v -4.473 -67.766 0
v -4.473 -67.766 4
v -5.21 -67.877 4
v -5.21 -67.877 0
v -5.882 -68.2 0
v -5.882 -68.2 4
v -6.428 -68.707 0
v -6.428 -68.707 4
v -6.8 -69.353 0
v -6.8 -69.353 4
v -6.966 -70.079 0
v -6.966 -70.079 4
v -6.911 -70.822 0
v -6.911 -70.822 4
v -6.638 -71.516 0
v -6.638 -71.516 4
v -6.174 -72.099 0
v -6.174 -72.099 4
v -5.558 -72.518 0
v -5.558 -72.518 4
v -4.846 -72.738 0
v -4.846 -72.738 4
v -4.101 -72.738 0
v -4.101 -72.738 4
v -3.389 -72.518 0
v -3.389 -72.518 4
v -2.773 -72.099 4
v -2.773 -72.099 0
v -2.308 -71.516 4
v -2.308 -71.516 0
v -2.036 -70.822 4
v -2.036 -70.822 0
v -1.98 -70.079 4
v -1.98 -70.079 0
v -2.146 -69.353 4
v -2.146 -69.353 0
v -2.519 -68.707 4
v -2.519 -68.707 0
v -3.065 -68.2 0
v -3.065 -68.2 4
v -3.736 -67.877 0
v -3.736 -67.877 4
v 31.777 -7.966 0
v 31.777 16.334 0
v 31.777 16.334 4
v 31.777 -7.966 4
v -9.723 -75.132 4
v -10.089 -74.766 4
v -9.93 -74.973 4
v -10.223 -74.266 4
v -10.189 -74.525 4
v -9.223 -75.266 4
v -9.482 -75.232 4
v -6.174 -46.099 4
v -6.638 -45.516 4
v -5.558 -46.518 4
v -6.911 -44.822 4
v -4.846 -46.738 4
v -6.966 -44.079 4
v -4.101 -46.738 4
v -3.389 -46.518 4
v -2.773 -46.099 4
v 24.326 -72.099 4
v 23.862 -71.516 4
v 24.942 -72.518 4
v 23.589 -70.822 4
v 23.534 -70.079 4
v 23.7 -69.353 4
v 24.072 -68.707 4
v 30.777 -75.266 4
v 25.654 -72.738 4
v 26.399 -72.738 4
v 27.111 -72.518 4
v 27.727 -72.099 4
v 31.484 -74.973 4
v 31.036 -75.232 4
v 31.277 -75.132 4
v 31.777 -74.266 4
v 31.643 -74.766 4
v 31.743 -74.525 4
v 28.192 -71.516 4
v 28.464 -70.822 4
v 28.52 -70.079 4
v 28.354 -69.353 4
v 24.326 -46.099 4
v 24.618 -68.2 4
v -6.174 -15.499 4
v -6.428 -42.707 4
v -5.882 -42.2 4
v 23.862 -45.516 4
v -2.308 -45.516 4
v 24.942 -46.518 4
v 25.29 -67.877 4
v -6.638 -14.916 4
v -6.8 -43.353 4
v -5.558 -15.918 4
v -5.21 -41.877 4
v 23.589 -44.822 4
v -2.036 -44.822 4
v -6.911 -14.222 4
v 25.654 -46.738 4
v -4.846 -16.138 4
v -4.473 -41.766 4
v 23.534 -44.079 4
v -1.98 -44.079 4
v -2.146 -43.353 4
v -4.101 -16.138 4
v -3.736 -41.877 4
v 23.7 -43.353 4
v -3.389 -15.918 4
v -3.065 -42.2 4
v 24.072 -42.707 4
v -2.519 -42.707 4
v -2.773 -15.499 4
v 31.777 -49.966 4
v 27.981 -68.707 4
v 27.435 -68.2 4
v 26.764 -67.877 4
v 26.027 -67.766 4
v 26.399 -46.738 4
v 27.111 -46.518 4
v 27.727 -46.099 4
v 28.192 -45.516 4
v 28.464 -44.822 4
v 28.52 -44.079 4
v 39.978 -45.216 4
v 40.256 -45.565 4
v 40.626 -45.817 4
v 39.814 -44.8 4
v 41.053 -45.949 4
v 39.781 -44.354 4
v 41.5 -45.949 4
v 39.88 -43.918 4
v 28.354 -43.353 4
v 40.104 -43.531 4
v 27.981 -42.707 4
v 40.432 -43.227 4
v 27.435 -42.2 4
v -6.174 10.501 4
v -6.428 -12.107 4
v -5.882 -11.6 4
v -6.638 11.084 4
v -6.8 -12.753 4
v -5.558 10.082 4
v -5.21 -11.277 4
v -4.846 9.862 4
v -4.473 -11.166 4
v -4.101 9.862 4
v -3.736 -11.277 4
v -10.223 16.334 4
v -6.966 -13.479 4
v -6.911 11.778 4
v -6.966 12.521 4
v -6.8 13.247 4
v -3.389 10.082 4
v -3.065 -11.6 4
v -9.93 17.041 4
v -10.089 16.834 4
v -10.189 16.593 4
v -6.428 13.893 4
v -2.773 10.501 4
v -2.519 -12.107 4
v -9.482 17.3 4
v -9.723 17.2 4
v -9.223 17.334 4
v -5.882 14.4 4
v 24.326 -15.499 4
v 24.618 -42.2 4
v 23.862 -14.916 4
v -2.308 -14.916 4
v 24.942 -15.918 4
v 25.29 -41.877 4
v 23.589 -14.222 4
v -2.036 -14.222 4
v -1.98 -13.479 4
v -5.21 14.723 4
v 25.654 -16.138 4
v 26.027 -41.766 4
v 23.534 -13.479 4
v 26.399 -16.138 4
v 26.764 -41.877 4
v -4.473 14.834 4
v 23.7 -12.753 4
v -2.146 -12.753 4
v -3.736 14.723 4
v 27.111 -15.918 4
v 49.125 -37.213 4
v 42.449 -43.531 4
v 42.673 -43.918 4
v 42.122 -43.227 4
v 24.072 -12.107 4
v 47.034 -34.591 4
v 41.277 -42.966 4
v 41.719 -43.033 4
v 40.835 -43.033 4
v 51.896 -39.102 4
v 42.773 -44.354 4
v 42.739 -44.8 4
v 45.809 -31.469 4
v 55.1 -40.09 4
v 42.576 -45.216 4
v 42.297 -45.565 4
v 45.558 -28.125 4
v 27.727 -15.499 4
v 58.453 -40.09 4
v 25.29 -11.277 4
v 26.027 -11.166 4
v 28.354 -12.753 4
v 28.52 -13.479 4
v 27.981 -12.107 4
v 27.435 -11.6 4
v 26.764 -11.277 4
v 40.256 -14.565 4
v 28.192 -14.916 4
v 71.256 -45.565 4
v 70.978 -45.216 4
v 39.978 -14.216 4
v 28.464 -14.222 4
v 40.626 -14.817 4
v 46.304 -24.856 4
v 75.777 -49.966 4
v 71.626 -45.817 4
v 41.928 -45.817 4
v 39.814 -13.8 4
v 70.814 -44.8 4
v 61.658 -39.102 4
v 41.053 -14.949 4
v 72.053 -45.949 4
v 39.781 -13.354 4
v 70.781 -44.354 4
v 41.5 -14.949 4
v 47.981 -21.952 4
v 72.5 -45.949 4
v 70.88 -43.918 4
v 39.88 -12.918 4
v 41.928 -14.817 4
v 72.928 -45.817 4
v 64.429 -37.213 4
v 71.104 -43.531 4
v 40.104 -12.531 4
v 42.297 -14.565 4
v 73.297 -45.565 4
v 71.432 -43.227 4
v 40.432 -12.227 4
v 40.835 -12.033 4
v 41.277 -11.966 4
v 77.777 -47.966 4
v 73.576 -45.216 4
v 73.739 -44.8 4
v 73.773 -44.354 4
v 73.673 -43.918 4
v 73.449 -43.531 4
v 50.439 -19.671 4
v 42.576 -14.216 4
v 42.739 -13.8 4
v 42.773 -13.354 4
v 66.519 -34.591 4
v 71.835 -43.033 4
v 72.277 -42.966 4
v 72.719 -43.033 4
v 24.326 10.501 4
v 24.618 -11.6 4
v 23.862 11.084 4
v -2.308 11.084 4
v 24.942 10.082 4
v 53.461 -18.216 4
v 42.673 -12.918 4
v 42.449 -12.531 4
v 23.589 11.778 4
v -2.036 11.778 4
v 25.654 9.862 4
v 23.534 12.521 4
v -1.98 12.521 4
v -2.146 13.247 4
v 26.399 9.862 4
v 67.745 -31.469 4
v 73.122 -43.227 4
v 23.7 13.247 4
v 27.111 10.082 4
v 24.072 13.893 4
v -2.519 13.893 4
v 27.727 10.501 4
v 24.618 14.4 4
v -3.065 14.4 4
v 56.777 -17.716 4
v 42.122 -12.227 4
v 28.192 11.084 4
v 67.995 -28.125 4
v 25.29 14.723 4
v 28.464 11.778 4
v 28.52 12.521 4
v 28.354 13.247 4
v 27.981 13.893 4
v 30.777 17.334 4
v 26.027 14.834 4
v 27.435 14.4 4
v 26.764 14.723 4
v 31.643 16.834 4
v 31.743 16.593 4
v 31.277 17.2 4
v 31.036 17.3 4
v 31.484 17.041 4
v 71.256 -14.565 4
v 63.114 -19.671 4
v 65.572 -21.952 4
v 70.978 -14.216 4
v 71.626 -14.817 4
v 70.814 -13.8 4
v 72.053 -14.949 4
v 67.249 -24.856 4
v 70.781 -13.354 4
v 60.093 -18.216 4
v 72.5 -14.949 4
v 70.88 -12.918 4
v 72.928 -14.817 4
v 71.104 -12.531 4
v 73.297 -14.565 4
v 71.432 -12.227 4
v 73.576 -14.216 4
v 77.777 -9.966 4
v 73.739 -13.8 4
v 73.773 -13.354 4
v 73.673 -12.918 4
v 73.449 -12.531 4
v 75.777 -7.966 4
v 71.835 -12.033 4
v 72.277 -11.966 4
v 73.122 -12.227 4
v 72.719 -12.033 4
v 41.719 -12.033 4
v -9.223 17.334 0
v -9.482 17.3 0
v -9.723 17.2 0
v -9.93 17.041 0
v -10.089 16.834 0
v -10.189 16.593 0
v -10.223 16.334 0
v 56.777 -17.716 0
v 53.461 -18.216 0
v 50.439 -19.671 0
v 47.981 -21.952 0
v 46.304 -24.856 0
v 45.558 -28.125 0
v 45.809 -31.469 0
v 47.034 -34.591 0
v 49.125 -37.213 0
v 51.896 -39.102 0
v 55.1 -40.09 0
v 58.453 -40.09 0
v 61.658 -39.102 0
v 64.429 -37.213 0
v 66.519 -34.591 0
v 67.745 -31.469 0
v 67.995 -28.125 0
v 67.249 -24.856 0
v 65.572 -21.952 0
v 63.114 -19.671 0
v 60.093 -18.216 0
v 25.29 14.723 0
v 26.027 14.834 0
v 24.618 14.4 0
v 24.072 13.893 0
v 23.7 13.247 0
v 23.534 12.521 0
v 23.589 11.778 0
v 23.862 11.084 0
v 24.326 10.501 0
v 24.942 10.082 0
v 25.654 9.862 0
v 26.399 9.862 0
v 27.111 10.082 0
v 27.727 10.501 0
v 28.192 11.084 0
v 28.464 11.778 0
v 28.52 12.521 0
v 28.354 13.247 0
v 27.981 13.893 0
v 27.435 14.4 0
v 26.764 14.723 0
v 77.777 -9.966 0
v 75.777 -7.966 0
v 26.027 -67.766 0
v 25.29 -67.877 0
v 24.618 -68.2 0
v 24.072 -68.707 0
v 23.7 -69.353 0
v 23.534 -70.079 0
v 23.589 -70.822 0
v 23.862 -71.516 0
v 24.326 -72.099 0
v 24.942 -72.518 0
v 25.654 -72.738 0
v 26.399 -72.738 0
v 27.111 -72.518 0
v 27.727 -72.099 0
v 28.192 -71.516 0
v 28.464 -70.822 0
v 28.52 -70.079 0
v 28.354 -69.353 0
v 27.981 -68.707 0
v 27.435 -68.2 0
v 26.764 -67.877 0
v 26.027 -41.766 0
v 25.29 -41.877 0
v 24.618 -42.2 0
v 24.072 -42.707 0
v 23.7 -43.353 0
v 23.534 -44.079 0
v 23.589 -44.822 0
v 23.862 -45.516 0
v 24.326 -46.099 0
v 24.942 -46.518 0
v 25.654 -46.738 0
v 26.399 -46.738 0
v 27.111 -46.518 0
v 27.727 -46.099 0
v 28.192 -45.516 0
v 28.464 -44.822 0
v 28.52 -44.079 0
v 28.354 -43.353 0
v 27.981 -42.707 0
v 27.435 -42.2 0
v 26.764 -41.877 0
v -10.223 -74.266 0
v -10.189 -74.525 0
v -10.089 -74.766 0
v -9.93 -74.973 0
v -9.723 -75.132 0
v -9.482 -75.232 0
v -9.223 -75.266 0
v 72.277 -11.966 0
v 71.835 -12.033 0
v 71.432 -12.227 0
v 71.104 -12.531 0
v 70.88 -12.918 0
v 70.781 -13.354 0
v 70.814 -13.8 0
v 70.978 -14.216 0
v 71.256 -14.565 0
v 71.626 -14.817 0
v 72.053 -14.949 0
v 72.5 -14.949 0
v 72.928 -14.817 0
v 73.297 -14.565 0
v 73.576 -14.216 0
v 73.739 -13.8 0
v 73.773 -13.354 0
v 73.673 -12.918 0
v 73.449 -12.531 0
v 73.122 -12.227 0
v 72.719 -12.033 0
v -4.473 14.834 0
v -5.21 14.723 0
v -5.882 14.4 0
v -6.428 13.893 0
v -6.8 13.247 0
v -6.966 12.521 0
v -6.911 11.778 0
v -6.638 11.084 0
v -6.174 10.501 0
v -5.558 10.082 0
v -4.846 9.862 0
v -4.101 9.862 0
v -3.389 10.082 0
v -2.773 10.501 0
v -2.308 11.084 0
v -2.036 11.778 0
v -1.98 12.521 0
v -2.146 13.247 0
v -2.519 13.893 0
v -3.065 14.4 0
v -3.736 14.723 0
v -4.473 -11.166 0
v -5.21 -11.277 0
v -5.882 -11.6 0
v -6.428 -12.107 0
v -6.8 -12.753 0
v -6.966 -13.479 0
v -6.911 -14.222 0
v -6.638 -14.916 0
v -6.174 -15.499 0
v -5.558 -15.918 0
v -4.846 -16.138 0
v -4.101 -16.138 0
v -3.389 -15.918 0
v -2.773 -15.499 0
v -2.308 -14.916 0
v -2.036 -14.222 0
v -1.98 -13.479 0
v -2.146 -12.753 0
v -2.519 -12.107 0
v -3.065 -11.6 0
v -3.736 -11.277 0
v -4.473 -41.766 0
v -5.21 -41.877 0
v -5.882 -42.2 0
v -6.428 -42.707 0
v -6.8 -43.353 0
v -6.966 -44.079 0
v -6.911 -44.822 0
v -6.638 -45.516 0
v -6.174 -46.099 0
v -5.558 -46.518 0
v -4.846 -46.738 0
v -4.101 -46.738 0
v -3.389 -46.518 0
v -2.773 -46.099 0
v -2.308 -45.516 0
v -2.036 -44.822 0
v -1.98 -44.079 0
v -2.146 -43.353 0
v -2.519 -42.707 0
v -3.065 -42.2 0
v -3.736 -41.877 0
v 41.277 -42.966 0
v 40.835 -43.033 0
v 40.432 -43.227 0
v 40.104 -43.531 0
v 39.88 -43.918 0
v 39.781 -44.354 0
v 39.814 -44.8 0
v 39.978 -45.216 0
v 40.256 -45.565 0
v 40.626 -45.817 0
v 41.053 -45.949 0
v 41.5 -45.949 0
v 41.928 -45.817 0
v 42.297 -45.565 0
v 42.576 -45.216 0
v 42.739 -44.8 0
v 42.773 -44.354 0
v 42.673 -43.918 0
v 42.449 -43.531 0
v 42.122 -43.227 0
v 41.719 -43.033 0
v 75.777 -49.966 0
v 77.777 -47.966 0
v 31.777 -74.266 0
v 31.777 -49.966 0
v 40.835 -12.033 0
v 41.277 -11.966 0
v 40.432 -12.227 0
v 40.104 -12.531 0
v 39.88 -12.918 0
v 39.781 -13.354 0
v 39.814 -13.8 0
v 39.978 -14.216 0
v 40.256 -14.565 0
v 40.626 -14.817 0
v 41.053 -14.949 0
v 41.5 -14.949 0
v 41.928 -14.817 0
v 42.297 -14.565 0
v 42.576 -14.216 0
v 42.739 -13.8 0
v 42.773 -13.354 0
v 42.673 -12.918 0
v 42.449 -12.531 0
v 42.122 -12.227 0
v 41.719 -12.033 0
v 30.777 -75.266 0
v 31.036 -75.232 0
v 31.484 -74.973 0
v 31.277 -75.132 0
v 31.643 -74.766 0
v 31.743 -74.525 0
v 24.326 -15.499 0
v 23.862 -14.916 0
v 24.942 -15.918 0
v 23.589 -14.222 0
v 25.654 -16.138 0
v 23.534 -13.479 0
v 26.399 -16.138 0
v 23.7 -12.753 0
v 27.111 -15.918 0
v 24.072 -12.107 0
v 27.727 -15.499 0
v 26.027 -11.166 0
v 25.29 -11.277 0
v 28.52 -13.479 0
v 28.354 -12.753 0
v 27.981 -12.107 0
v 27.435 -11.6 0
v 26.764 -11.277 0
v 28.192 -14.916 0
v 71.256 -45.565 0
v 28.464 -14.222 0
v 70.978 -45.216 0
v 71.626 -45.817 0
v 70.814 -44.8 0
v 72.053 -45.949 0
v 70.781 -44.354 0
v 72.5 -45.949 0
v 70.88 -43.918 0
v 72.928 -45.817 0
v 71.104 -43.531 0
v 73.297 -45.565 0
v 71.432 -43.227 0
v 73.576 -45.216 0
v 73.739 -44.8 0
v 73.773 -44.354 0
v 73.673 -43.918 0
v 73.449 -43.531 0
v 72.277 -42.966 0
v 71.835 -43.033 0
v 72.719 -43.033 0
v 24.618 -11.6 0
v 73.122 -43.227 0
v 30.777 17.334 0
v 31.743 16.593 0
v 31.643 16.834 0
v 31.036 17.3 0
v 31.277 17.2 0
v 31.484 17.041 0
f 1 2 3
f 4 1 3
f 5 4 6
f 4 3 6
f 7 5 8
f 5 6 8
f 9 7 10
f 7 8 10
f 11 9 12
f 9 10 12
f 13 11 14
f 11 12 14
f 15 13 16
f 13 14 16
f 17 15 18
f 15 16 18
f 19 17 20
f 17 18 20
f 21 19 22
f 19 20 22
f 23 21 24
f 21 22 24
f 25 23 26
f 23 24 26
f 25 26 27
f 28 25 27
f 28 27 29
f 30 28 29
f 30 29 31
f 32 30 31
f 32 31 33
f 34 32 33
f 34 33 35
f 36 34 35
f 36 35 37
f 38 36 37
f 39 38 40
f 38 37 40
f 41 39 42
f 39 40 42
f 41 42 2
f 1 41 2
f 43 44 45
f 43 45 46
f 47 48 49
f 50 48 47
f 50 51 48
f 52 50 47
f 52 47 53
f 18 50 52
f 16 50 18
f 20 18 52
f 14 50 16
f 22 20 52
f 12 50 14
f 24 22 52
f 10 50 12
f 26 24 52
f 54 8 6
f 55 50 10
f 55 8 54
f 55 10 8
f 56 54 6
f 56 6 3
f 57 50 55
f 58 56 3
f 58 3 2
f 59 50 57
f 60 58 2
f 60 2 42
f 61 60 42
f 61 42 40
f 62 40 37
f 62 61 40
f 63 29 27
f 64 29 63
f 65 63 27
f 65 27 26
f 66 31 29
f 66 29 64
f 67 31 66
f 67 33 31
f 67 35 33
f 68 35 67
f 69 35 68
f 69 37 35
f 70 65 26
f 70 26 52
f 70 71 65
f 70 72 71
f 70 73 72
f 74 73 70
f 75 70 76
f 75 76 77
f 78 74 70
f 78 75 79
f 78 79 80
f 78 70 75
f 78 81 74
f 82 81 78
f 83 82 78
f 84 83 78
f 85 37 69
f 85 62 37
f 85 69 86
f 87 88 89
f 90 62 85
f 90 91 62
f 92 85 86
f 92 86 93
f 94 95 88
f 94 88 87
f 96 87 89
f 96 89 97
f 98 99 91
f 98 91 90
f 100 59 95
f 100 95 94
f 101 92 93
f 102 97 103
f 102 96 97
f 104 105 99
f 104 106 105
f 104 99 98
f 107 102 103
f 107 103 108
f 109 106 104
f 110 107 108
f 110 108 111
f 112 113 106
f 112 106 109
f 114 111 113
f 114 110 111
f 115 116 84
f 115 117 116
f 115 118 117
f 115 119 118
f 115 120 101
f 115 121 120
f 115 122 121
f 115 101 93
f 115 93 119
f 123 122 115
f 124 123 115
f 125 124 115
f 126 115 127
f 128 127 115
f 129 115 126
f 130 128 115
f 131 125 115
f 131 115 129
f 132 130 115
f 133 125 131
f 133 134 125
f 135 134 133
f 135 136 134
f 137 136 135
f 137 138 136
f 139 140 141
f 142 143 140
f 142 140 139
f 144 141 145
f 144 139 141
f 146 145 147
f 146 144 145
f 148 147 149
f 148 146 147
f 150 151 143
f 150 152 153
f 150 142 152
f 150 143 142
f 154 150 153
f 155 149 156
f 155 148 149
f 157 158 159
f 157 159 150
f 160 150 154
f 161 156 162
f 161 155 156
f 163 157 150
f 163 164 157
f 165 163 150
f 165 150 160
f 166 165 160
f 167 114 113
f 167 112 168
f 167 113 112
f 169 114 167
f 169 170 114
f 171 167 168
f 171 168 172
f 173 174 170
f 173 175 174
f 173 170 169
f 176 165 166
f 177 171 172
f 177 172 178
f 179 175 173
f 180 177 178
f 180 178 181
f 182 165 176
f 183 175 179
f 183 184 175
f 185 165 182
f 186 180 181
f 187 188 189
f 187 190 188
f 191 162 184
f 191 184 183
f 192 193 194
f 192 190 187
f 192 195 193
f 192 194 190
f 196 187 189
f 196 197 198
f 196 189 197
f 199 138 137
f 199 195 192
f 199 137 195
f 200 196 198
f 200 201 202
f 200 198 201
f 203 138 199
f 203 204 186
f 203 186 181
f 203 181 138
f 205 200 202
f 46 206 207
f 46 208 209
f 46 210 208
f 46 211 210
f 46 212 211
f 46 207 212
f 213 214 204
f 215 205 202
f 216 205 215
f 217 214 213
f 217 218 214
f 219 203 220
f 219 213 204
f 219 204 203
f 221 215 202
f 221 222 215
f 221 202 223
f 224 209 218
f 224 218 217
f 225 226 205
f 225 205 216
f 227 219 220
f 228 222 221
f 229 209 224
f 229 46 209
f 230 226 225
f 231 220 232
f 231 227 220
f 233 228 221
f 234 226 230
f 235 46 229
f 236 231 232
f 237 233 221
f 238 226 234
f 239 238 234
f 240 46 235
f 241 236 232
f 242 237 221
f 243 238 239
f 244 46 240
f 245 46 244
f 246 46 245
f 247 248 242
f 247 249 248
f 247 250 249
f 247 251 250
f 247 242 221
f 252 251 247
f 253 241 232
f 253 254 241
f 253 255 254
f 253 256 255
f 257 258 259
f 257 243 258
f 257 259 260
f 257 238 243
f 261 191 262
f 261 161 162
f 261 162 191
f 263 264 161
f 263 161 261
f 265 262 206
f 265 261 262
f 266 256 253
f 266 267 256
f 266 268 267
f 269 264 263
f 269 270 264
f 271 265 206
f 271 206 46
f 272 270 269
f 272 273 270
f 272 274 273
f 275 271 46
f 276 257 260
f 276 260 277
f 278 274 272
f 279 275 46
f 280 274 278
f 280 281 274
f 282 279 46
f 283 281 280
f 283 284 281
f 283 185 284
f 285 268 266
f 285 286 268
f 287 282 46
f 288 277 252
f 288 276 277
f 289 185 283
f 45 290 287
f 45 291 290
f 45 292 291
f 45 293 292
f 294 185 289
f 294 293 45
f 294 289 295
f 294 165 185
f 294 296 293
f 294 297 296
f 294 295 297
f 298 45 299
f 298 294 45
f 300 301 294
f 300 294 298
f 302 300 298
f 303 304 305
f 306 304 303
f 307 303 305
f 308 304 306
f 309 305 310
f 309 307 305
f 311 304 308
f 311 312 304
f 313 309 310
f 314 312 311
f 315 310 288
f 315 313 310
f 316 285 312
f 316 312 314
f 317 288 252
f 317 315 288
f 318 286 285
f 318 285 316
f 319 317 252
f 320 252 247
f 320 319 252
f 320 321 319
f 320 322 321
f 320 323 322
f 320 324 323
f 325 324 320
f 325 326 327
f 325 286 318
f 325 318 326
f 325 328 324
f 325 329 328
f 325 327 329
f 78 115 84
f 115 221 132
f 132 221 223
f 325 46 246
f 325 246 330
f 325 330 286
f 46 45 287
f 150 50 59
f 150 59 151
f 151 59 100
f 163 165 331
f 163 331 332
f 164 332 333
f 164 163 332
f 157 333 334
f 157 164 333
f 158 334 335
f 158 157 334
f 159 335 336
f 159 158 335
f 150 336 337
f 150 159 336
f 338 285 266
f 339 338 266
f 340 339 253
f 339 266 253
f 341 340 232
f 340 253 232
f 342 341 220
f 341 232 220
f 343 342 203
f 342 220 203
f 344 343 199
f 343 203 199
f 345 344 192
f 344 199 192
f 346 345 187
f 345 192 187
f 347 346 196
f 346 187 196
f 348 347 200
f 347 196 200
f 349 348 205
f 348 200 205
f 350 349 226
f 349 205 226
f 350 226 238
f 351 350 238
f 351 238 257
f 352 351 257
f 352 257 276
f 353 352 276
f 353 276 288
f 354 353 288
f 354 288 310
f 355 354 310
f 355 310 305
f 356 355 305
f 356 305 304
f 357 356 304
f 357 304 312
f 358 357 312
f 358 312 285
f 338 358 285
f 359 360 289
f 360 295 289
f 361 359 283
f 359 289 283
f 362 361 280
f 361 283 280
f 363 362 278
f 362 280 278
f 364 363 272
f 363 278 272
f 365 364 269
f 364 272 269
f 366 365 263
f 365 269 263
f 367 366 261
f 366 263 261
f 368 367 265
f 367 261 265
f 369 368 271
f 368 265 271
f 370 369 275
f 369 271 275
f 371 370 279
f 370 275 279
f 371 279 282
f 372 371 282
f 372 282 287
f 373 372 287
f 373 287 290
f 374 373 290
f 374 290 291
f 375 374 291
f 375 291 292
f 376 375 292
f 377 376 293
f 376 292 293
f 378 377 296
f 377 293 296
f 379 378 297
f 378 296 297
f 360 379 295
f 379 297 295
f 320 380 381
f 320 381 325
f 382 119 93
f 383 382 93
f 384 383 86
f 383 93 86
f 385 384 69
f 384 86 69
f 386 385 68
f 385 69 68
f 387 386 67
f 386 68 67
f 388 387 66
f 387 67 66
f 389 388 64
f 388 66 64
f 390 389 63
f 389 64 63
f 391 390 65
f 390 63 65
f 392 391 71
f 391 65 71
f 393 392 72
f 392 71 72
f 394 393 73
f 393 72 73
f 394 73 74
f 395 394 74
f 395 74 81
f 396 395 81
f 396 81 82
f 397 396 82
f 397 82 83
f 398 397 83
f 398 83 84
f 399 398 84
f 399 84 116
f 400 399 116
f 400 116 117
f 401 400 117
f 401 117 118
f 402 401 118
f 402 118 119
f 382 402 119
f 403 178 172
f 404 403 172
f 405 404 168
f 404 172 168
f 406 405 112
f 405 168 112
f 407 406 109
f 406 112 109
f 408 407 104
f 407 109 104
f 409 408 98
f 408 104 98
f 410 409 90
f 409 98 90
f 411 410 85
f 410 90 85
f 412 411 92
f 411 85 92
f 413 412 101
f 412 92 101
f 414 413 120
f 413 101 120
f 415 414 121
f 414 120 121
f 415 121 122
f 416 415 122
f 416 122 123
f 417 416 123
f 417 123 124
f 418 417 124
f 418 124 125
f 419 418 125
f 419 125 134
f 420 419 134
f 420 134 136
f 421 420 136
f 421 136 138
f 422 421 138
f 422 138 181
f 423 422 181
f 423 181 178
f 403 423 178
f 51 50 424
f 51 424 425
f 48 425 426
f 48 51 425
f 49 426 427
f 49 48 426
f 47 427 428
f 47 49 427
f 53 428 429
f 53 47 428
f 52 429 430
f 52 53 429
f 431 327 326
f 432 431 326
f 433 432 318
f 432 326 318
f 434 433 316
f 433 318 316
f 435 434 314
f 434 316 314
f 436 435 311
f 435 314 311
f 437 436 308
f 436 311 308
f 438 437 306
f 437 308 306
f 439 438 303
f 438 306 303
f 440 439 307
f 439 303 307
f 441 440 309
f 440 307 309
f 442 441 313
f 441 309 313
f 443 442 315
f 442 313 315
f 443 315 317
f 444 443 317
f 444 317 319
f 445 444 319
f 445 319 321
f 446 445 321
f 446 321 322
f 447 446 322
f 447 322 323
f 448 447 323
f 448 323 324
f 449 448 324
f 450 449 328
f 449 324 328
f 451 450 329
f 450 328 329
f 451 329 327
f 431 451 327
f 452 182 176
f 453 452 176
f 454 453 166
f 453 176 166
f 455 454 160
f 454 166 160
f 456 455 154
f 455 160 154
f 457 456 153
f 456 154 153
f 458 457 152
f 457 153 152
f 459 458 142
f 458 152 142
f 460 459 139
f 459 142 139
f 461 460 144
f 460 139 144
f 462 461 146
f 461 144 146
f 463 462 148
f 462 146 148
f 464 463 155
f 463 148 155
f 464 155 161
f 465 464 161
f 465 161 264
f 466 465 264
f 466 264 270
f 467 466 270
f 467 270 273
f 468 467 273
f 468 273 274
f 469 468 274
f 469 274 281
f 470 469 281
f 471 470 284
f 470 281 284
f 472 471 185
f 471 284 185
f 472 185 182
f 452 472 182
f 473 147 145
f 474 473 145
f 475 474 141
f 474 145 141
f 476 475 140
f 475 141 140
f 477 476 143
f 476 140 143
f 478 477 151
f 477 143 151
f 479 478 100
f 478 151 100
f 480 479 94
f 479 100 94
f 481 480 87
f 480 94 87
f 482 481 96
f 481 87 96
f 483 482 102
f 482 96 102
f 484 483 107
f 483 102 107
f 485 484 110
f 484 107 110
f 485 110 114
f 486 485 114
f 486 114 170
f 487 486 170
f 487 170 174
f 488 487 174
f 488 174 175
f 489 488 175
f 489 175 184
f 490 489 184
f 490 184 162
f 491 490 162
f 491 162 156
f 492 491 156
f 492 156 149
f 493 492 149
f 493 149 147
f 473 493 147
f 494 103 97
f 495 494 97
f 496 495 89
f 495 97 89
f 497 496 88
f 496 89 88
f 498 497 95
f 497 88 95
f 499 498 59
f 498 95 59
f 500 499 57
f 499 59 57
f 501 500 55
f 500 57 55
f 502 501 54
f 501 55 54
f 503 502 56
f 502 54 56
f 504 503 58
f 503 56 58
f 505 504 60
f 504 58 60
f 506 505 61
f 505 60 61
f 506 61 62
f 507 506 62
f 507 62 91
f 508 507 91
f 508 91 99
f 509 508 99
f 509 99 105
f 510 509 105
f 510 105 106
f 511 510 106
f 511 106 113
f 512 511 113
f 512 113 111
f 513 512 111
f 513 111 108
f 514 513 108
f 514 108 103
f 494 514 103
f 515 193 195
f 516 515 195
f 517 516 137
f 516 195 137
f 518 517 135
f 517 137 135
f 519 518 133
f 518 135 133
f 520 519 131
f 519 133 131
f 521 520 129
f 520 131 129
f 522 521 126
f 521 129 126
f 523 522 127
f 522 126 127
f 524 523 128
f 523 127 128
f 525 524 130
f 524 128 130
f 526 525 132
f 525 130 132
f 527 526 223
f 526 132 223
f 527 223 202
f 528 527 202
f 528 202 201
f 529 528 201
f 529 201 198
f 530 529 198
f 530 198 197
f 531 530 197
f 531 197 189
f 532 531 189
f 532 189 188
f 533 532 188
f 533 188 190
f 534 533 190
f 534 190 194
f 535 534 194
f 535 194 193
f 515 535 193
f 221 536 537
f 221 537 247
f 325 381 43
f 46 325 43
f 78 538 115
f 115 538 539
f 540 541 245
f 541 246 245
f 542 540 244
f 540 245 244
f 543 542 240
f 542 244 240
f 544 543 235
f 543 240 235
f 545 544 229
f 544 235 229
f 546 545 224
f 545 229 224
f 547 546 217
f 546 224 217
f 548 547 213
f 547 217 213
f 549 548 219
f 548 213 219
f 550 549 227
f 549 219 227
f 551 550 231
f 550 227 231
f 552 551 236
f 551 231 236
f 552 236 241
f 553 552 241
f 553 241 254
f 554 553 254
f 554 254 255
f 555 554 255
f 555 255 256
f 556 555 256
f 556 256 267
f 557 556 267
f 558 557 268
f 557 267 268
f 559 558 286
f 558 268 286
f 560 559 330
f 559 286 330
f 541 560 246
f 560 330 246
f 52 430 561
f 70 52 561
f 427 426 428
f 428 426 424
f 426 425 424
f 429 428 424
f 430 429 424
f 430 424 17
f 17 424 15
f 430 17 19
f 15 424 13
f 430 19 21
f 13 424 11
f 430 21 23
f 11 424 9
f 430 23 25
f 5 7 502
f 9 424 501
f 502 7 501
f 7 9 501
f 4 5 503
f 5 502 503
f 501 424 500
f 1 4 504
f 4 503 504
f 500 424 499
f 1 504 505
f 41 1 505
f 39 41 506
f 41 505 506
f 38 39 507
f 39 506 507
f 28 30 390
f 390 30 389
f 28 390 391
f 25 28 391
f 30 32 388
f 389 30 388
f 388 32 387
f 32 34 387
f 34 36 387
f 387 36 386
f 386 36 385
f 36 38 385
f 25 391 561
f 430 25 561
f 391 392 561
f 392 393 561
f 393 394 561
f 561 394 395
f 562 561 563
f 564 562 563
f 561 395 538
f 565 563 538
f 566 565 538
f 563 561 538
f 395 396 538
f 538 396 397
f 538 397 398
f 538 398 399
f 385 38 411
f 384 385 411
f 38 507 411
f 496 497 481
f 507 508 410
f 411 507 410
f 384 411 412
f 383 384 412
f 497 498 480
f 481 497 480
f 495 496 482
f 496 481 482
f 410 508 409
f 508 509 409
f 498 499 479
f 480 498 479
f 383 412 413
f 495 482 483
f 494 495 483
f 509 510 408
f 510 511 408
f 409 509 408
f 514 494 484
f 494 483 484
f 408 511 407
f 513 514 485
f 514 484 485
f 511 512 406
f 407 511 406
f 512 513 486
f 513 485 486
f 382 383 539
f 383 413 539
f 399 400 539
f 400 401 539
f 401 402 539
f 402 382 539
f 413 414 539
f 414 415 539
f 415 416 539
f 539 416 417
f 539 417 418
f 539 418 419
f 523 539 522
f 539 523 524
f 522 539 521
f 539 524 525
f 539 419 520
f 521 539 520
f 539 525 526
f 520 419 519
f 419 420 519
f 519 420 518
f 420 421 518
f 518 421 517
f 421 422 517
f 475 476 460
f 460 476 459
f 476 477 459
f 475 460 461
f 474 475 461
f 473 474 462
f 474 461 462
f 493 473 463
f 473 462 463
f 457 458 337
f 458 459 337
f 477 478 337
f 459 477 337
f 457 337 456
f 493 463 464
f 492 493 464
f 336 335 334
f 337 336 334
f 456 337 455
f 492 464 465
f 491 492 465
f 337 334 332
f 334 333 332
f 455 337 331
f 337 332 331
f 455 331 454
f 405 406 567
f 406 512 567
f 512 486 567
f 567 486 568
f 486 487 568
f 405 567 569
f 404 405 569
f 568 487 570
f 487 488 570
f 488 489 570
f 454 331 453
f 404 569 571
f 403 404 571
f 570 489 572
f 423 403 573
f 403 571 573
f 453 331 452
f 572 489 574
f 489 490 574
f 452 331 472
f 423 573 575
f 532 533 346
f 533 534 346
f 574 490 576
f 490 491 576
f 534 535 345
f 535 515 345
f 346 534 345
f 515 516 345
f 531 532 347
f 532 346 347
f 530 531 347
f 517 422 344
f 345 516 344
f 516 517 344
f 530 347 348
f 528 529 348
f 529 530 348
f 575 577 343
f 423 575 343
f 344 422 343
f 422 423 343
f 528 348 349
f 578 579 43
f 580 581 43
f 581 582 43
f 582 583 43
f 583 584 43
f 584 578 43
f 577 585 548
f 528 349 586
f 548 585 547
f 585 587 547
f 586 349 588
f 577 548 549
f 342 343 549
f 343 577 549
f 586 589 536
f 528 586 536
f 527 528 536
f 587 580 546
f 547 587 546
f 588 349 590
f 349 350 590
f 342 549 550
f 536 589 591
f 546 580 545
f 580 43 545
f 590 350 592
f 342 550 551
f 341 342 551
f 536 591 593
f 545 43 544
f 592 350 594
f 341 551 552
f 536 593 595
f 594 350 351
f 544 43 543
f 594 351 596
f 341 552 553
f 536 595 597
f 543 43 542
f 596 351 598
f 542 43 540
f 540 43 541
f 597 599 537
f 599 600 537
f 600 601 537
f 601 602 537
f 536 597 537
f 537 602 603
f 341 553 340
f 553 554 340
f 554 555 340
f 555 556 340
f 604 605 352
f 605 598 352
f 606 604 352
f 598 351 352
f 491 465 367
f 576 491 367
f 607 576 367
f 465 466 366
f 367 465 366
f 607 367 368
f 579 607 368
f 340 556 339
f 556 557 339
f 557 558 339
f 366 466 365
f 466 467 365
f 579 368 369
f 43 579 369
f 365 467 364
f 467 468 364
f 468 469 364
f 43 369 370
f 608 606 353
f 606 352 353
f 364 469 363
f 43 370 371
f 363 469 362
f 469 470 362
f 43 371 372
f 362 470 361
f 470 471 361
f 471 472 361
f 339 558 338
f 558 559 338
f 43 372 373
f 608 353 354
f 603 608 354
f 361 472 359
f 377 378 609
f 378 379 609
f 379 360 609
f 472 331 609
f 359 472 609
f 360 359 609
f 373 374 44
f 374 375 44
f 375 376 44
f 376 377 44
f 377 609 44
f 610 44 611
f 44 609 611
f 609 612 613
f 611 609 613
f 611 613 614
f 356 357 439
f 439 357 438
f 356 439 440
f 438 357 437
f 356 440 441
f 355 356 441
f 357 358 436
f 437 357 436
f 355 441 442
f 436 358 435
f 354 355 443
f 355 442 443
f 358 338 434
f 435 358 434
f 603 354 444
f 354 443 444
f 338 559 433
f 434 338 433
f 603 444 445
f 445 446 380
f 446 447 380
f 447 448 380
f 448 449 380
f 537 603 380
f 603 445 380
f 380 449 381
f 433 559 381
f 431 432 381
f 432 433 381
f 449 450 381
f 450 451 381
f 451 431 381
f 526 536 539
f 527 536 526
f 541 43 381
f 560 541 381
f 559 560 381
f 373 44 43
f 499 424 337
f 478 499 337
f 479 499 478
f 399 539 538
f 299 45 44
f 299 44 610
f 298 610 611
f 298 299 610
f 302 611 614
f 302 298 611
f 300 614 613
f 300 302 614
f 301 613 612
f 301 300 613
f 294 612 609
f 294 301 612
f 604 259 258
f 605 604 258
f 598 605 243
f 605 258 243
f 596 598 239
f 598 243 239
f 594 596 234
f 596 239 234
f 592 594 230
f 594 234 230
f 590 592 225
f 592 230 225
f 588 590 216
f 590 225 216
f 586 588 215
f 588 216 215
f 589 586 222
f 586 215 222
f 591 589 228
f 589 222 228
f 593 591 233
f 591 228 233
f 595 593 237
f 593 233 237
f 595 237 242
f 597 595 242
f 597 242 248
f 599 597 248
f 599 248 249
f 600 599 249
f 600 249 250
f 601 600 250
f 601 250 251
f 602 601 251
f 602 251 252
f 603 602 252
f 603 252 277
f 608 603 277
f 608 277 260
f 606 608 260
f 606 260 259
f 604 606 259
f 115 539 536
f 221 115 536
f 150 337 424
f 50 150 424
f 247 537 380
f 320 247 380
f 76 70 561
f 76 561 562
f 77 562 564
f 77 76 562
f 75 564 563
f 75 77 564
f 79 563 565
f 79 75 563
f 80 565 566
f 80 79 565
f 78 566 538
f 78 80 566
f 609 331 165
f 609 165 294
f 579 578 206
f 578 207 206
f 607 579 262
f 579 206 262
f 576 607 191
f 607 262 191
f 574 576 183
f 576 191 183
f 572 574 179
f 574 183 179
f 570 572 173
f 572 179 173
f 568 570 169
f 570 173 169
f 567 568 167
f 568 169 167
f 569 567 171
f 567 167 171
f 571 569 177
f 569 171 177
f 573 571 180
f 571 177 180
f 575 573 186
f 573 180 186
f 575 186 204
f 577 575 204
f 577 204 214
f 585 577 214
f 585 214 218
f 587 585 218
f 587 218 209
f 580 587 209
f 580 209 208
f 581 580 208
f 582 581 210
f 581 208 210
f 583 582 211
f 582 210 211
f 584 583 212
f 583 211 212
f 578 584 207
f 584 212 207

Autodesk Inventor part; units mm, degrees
ref_plane "YZ Plane" through (0, 0, 0) normal (1, 0, 0) x (0, 1, 0)
ref_plane "XZ Plane" through (0, 0, 0) normal (0, 1, 0) x (-1, 0, 0)
ref_plane "XY Plane" through (0, 0, 0) normal (0, 0, 1) x (1, 0, 0)
sketch "Szkic1" plane through (0, 0, 0) normal (0, 0, 1) x (1, 0, 0)
  line L0 (-10.2233, 17.3341) -> (-10.2233, -75.2659)
  line L1 (-10.2233, -75.2659) -> (31.7767, -75.2659)
  line L2 (-10.2233, 17.3341) -> (31.7767, 17.3341)
  line L3 (31.7767, 17.3341) -> (31.7767, -7.9659)
  line L4 (31.7767, -75.2659) -> (31.7767, -49.9659)
  line L5 (31.7767, -49.9659) -> (77.7767, -49.9659)
  line L6 (77.7767, -49.9659) -> (77.7767, -7.9659)
  line L7 (77.7767, -7.9659) -> (31.7767, -7.9659)
  point P0 (0, 0)
  point P1 (41.2767, -13.4659)
  point P2 (72.2767, -13.4659)
  point P3 (41.2767, -44.4659)
  point P4 (72.2767, -44.4659)
  point P5 (56.7767, -28.9659)
  point P6 (-4.4733, 12.3341)
  point P7 (26.0267, 12.3341)
  point P8 (-4.4733, -13.6659)
  point P9 (26.0267, -13.6659)
  point P10 (-4.4733, -44.2659)
  point P11 (26.0267, -44.2659)
  point P12 (-4.4733, -70.2659)
  point P13 (26.0267, -70.2659)
  dimension "d0" = 92.6
  dimension "d1" = 42
  dimension "d2" = 42
  dimension "d3" = 46
  dimension "d4" = 25.3
  dimension "d11" = 15.5
  dimension "d12" = 15.5
  dimension "d14" = 15.5
  dimension "d15" = 15.5
  dimension "d16" = 15.5
  dimension "d17" = 15.5
  dimension "d18" = 15.5
  dimension "d19" = 15.5
  dimension "d20" = 21
  dimension "d21" = 21
  dimension "d39" = 5
  dimension "d40" = 5
  dimension "d41" = 5
  dimension "d42" = 5
  dimension "d43" = 5.75
  dimension "d44" = 5.75
  dimension "d45" = 42
  dimension "d46" = 5.75
  dimension "d47" = 5.75
  dimension "d48" = 5.75
  dimension "d49" = 5.75
  dimension "d50" = 25.3
  dimension "d51" = 5.75
  dimension "d52" = 5.75
  dimension "d60" = 26
  dimension "d61" = 26
  dimension "d62" = 26
  dimension "d63" = 26
extrude "Wyciągnięcie proste1" add sketch "Szkic1" along normal blind 4
hole "Otwór1" at (41.2767, -13.4659, 0) at (72.2767, -13.4659, 0) at (41.2767, -44.4659, 0) at (72.2767, -44.4659, 0) direction (0, 0, 1) diameter 3 end through all
hole "Otwór2" at (56.7767, -28.9659, 0) direction (0, 0, 1) diameter 22.5 end through all
chamfer "Faza1" distance 2 angle 45 2 edges at (77.7767, -7.9659, 2) (77.7767, -49.9659, 2)
hole "Otwór3" at (-4.4733, 12.3341, 0) at (26.0267, 12.3341, 0) at (-4.4733, -13.6659, 0) at (26.0267, -13.6659, 0) at (-4.4733, -44.2659, 0) at (26.0267, -44.2659, 0) at (-4.4733, -70.2659, 0) at (26.0267, -70.2659, 0) direction (0, 0, 1) diameter 5 end through all
fillet "Zaokrąglenie1" radius 1 4 edges at (31.7767, 17.3341, 2) (-10.2233, 17.3341, 2) (31.7767, -75.2659, 2) (-10.2233, -75.2659, 2)
equation "\"d4\" = -0.5 * d2 + 0.5 * d0"
equation "\"d11\" = 0.5 * d9"
equation "\"d12\" = d11"
equation "\"d14\" = d11"
equation "\"d21\" = d20"
equation "\"d39\" = d41"
equation "\"d40\" = d41"
equation "\"d42\" = d41"
equation "\"d44\" = d43"
equation "\"d45\" = d1"
equation "\"d46\" = d43"
equation "\"d47\" = d43"
equation "\"d48\" = d43"
equation "\"d49\" = d43"
equation "\"d51\" = d43"
equation "\"d52\" = d43"
equation "\"d9\" = 31"
properties part number "LC_ALU_4mm_X_End_Motor_Side"
